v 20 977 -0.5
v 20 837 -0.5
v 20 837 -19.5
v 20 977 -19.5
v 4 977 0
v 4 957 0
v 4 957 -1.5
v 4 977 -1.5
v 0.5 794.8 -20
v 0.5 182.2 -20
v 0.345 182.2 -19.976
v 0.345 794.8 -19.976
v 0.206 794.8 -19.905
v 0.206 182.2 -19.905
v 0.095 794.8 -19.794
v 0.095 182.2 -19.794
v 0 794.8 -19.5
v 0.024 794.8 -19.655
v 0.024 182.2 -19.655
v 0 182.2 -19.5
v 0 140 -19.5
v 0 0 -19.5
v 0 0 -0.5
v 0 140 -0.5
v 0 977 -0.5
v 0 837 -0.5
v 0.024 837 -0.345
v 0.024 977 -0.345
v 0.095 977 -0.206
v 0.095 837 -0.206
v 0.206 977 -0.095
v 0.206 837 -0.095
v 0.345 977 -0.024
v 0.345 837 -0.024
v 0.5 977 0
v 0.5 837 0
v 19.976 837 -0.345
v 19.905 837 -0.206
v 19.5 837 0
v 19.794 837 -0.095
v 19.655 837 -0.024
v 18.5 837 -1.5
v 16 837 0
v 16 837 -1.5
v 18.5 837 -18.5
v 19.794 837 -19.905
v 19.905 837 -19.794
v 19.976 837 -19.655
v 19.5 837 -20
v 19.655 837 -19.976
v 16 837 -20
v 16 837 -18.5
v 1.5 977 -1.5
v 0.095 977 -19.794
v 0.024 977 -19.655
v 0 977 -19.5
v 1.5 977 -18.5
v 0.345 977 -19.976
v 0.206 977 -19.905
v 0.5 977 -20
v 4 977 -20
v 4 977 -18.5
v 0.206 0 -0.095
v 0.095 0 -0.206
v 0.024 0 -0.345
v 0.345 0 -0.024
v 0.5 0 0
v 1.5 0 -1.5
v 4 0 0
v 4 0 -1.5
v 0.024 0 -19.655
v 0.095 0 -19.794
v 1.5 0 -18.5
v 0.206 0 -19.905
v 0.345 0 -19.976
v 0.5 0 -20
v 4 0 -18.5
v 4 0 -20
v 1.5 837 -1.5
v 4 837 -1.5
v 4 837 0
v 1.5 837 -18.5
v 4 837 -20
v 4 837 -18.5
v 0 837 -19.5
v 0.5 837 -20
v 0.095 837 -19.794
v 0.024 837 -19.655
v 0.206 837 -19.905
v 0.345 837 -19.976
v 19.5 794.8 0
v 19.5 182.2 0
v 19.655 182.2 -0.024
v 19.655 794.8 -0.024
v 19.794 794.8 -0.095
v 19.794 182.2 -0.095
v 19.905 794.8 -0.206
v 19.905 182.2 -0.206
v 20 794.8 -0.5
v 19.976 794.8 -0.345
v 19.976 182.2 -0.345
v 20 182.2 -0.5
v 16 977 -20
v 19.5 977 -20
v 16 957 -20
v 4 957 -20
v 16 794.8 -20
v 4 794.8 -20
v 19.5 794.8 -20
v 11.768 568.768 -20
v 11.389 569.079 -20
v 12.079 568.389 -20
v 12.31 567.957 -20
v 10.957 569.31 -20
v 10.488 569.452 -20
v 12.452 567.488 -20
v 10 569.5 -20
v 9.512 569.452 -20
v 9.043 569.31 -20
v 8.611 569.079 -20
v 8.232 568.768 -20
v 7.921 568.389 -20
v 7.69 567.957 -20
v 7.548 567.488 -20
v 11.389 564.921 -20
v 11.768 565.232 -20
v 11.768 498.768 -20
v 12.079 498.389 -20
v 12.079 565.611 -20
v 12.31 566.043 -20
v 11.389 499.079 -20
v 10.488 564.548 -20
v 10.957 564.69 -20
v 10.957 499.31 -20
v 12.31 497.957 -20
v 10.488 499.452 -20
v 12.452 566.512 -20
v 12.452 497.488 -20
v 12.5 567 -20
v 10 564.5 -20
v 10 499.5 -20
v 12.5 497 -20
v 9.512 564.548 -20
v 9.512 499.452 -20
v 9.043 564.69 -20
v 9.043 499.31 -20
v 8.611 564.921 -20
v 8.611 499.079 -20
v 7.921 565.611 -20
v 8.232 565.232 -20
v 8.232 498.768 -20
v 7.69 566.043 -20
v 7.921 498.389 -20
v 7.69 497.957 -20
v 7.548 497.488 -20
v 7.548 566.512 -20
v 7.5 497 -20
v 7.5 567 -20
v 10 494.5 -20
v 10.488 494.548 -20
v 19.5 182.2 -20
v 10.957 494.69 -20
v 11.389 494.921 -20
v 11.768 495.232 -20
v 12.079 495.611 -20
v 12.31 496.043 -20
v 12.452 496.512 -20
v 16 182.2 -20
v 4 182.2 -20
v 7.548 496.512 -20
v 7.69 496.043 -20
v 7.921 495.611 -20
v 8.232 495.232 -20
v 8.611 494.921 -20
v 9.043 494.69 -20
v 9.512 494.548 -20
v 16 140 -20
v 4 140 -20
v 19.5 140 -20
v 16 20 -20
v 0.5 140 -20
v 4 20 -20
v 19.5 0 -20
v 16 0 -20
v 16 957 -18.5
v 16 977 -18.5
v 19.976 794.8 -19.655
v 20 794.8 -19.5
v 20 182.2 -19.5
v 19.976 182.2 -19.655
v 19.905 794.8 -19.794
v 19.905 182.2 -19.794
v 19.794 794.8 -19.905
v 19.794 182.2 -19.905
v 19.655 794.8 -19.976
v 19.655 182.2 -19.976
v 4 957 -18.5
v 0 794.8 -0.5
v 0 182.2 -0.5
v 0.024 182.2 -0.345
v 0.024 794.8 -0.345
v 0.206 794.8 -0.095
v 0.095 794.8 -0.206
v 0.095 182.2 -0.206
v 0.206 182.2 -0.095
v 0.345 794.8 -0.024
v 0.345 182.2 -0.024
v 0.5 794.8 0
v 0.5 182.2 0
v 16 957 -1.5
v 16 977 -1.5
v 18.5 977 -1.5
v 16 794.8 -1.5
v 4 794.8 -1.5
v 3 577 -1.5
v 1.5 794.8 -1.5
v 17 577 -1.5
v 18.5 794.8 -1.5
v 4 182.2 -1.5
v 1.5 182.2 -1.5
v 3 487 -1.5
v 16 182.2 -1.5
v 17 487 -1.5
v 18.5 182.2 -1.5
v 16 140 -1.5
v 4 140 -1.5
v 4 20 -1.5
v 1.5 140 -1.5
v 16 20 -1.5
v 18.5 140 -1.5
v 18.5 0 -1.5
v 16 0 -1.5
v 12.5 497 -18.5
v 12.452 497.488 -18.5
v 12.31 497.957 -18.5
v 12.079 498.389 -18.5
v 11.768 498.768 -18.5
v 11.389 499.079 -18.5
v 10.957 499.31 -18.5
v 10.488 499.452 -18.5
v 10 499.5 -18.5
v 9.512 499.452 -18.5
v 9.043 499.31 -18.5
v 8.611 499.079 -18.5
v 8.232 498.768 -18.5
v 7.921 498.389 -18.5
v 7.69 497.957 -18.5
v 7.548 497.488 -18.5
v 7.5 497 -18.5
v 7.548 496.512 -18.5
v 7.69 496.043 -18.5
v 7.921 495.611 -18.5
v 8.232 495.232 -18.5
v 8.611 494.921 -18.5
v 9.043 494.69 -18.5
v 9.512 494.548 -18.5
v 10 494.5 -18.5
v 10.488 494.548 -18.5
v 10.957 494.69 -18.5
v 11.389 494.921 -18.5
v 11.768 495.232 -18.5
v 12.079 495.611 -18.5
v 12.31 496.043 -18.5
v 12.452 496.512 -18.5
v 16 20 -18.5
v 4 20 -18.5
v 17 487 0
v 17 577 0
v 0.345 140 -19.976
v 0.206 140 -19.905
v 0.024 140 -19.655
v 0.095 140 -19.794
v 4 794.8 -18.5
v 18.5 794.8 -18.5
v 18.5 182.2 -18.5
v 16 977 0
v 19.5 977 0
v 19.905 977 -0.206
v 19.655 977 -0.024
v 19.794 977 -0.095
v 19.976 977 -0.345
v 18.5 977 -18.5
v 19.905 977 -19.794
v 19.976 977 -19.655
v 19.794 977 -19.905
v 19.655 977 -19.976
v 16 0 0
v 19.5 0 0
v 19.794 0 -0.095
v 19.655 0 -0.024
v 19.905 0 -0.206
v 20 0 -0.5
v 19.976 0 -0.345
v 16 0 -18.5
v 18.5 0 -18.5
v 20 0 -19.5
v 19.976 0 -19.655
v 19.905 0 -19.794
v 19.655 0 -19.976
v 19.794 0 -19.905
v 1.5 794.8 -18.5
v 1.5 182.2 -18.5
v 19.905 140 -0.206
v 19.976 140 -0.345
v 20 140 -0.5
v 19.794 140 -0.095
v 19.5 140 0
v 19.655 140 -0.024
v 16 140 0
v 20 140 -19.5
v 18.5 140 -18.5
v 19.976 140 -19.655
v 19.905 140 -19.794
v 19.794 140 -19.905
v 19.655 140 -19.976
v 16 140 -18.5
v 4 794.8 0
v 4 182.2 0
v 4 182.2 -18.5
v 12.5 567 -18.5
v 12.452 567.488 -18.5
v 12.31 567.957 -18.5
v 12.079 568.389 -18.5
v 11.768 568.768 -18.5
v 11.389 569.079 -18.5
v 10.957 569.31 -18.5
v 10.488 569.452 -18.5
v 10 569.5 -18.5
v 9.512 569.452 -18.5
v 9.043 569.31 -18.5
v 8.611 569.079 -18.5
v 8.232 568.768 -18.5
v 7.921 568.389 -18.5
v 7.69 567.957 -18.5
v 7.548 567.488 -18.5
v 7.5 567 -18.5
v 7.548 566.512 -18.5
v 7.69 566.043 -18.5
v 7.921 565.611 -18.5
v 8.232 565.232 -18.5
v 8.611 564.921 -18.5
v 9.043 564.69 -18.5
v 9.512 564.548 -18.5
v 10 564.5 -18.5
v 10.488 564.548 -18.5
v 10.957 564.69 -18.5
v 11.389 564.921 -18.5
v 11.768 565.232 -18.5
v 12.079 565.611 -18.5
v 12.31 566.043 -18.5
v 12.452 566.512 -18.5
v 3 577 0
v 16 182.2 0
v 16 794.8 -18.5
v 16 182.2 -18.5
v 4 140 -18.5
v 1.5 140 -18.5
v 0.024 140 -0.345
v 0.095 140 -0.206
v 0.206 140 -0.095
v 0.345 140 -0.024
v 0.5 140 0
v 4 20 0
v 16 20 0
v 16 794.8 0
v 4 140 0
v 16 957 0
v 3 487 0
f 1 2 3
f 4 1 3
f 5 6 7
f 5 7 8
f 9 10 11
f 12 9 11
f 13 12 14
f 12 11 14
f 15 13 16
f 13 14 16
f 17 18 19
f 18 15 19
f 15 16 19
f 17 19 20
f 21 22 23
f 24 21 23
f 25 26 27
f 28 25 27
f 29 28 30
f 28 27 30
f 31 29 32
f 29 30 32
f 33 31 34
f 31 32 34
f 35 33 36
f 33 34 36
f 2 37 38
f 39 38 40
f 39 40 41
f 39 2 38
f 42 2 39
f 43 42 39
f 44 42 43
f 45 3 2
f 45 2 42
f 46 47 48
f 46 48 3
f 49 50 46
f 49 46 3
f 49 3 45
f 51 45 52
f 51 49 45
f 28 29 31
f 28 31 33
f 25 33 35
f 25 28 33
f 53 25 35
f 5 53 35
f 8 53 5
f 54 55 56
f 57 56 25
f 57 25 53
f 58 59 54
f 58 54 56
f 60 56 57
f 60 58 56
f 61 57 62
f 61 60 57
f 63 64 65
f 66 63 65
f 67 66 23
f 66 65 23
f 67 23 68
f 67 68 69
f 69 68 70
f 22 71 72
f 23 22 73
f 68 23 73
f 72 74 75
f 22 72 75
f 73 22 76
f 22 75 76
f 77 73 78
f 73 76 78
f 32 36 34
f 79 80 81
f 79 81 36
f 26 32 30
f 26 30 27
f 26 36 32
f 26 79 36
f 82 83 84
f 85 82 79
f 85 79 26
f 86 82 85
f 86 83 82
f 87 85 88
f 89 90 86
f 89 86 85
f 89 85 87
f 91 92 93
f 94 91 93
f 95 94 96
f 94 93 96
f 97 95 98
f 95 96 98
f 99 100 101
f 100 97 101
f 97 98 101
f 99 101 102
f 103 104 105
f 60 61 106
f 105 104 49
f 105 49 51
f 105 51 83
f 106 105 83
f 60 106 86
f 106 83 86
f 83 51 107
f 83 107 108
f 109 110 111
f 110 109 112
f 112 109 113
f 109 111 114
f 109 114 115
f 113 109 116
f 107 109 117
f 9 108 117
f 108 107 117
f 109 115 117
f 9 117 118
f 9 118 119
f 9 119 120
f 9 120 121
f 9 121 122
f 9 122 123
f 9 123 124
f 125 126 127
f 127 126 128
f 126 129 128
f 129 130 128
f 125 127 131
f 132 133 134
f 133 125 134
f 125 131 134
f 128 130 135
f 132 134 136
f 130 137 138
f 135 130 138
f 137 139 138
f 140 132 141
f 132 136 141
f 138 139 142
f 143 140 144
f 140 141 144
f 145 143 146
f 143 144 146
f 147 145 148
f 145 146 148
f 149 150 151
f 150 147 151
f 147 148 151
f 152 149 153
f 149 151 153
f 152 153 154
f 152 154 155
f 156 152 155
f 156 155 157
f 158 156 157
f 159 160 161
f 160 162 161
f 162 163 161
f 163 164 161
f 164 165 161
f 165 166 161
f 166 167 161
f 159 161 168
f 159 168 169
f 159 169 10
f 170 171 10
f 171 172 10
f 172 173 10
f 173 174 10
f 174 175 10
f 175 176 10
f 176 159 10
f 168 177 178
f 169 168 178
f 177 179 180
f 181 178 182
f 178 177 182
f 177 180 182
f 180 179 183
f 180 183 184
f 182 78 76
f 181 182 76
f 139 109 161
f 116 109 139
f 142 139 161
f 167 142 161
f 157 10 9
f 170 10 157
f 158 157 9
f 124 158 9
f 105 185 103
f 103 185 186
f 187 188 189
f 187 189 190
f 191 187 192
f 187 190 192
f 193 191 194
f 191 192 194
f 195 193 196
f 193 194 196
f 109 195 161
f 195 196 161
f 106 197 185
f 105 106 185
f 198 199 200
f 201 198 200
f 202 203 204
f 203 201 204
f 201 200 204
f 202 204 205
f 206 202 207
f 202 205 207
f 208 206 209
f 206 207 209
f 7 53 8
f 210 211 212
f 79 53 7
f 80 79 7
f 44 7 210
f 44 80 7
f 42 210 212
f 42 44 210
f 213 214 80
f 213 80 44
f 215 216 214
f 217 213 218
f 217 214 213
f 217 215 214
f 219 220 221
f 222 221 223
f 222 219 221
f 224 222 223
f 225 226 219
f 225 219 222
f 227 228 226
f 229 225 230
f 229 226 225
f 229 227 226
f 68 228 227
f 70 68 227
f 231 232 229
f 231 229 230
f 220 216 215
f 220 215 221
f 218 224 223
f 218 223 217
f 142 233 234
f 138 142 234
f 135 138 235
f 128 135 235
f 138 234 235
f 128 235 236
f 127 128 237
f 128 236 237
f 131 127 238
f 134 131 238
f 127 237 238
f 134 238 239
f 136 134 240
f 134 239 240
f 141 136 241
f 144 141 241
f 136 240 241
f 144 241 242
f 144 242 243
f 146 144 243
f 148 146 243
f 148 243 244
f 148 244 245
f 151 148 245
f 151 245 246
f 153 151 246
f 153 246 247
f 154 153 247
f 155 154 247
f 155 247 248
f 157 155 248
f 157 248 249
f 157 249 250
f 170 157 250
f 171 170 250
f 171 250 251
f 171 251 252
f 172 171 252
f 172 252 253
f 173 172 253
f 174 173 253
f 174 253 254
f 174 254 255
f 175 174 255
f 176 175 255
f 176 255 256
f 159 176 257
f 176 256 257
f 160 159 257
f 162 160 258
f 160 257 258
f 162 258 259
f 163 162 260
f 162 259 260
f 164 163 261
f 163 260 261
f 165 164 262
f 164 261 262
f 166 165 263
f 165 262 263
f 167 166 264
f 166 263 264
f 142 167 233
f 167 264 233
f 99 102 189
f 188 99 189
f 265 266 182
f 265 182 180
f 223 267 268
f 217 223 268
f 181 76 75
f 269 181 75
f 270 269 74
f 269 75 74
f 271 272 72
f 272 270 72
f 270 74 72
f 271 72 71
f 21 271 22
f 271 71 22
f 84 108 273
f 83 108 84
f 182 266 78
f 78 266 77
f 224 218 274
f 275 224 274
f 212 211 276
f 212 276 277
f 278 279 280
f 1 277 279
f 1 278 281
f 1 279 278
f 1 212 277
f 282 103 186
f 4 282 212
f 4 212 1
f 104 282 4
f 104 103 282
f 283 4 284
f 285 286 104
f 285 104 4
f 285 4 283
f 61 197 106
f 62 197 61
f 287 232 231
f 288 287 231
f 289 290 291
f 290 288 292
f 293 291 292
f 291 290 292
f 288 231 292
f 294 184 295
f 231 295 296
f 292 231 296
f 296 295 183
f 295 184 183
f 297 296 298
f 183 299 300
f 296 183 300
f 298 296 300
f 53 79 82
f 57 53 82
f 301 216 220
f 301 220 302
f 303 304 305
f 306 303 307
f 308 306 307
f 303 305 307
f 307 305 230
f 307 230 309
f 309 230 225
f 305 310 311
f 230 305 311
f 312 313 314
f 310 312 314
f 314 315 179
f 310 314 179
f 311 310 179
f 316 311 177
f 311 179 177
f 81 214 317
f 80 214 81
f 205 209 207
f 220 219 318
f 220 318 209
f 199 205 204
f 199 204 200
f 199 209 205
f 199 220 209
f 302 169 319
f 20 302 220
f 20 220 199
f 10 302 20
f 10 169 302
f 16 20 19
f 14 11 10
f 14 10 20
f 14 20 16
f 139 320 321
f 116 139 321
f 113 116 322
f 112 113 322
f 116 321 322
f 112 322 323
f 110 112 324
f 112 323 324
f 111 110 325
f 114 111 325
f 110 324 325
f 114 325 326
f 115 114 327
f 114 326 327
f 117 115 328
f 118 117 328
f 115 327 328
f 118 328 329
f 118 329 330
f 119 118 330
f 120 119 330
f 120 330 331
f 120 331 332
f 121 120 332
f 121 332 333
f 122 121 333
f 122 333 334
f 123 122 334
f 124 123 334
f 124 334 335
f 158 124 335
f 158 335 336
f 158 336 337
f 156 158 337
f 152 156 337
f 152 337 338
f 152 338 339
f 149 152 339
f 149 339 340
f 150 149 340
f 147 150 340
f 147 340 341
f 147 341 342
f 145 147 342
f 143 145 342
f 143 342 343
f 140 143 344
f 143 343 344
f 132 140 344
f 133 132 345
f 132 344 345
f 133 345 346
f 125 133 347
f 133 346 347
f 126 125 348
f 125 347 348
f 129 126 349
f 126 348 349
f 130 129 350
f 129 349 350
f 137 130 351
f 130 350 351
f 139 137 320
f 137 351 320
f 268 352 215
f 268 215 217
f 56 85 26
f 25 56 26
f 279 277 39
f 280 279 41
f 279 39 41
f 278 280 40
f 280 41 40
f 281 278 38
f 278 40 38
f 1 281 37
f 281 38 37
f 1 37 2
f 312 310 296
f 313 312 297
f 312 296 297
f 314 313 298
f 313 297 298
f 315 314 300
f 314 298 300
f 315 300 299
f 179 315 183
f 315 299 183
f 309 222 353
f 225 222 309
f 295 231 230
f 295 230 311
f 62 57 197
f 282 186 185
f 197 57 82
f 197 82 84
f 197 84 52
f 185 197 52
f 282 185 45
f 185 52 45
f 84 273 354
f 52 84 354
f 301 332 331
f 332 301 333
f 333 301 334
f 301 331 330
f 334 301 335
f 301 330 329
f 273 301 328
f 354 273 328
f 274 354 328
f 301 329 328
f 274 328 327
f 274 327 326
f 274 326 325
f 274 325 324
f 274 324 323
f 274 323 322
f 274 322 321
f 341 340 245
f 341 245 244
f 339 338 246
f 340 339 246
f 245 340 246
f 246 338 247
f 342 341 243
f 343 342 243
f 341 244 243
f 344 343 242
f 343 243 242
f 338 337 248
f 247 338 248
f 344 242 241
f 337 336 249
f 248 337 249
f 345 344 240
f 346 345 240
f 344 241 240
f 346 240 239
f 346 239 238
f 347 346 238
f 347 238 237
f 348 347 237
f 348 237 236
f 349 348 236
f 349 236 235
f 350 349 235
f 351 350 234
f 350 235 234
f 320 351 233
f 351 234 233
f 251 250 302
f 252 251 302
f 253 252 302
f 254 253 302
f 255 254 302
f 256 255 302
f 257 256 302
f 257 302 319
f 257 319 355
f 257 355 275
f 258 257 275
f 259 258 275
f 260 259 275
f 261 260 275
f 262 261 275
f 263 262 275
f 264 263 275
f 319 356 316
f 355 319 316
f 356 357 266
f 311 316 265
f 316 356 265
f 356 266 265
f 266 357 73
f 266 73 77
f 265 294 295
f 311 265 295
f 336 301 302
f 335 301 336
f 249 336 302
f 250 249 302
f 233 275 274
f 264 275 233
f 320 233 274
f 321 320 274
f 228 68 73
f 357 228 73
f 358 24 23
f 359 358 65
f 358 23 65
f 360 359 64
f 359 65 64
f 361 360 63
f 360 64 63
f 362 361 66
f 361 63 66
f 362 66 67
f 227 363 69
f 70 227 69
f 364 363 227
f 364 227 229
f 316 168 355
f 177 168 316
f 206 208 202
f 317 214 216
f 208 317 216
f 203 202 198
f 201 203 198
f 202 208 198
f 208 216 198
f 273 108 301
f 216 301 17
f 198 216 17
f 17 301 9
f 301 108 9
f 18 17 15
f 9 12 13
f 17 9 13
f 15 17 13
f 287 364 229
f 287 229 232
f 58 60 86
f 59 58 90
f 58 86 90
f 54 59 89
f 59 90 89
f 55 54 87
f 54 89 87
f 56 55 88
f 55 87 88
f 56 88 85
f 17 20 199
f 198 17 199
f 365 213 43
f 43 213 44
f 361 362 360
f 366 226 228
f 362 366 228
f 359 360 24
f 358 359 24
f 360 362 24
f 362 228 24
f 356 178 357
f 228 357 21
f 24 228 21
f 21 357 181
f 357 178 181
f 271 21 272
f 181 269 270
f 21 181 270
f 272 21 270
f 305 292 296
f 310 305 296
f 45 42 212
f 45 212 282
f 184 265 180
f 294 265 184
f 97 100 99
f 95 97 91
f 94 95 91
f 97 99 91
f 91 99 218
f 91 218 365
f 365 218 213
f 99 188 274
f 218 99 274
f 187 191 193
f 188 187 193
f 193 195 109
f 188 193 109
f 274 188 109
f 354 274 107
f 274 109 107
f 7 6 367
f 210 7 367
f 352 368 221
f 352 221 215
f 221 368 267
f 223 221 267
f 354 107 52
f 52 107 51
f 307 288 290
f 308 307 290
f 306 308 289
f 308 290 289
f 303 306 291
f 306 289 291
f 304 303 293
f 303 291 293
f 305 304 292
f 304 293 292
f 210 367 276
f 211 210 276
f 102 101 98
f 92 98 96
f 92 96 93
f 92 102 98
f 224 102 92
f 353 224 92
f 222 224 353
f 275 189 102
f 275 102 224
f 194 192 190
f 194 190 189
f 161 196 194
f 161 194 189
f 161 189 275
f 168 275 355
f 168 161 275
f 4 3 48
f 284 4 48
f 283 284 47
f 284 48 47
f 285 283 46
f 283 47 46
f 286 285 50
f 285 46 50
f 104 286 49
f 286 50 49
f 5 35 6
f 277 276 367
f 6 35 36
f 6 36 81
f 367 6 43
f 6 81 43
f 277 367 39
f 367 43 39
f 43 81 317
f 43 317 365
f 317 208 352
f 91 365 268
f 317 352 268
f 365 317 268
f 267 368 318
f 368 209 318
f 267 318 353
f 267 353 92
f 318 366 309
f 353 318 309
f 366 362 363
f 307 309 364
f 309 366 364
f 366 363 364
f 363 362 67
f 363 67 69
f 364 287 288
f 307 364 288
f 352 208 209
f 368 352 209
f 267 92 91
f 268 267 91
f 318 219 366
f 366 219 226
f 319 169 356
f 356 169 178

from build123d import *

# Parameters (mm, degrees)
SKETCH1_W           = 17
SKETCH1_H           = 17
BOSS_EXTRUDE1_DEPTH = 977
SKETCH2_W           = 12
SKETCH2_H           = 20
CUT_EXTRUDE1_DEPTH  = 1177
SKETCH3_W           = 4
SKETCH3_H           = 42.2
CUT_EXTRUDE2_DEPTH  = 1177
SKETCH7_W           = 14
SKETCH7_H           = 90
CUT_EXTRUDE5_DEPTH  = 10
SKETCH8_R           = 2.5
CUT_EXTRUDE6_DEPTH  = 10


with BuildPart() as part:
    # Sketch1 → Boss-Extrude1 (new body)
    with BuildSketch(Plane(origin=(0, 0, 0), x_dir=(1, 0, 0), z_dir=(0, 1, 0))):
        with BuildLine():
            Line((0.5, 0), (19.5, 0))
            ThreePointArc((19.5, 0), (19.853553391, 0.146446609), (20, 0.5))
            Line((20, 0.5), (20, 19.5))
            ThreePointArc((20, 19.5), (19.853553391, 19.853553391), (19.5, 20))
            Line((19.5, 20), (0.5, 20))
            ThreePointArc((0.5, 20), (0.146446609, 19.853553391), (0, 19.5))
            Line((0, 19.5), (0, 0.5))
            ThreePointArc((0, 0.5), (0.146446609, 0.146446609), (0.5, 0))
        make_face()
        with Locations((10, 10)):
            Rectangle(SKETCH1_W, SKETCH1_H, mode=Mode.SUBTRACT)
    extrude(amount=BOSS_EXTRUDE1_DEPTH)

    # Sketch2 → Cut-Extrude1 (cut)
    with BuildSketch(Plane.XY):
        with Locations((10, 967)):
            Rectangle(SKETCH2_W, SKETCH2_H)
    cut_extrude1 = extrude(amount=-CUT_EXTRUDE1_DEPTH, mode=Mode.SUBTRACT)

    # Sketch3 → Cut-Extrude2 (cut)
    with BuildSketch(Plane(origin=(0, 0, -20), x_dir=(-1, 0, 0), z_dir=(0, 0, -1))):
        with Locations((-2, 815.9)):
            Rectangle(SKETCH3_W, SKETCH3_H)
        with Locations((-18, 815.9)):
            Rectangle(SKETCH3_W, SKETCH3_H)
    cut_extrude2 = extrude(amount=-CUT_EXTRUDE2_DEPTH, mode=Mode.SUBTRACT)

    # Mirror1: Cut-Extrude1, Cut-Extrude2 across plane
    add(cut_extrude1.mirror(Plane.ZX.offset(488.5)), mode=Mode.SUBTRACT)
    add(cut_extrude2.mirror(Plane.ZX.offset(488.5)), mode=Mode.SUBTRACT)

    # Sketch7 → Cut-Extrude5 (cut)
    with BuildSketch(Plane.XY):
        with Locations((10, 532)):
            Rectangle(SKETCH7_W, SKETCH7_H)
    extrude(amount=-CUT_EXTRUDE5_DEPTH, mode=Mode.SUBTRACT)

    # Sketch8 → Cut-Extrude6 (cut)
    with BuildSketch(Plane.XY.offset(-18.5)):
        with Locations((10, 567)):
            Circle(SKETCH8_R)
        with Locations((10, 497)):
            Circle(SKETCH8_R)
    extrude(amount=-CUT_EXTRUDE6_DEPTH, mode=Mode.SUBTRACT)


solid = part.part
